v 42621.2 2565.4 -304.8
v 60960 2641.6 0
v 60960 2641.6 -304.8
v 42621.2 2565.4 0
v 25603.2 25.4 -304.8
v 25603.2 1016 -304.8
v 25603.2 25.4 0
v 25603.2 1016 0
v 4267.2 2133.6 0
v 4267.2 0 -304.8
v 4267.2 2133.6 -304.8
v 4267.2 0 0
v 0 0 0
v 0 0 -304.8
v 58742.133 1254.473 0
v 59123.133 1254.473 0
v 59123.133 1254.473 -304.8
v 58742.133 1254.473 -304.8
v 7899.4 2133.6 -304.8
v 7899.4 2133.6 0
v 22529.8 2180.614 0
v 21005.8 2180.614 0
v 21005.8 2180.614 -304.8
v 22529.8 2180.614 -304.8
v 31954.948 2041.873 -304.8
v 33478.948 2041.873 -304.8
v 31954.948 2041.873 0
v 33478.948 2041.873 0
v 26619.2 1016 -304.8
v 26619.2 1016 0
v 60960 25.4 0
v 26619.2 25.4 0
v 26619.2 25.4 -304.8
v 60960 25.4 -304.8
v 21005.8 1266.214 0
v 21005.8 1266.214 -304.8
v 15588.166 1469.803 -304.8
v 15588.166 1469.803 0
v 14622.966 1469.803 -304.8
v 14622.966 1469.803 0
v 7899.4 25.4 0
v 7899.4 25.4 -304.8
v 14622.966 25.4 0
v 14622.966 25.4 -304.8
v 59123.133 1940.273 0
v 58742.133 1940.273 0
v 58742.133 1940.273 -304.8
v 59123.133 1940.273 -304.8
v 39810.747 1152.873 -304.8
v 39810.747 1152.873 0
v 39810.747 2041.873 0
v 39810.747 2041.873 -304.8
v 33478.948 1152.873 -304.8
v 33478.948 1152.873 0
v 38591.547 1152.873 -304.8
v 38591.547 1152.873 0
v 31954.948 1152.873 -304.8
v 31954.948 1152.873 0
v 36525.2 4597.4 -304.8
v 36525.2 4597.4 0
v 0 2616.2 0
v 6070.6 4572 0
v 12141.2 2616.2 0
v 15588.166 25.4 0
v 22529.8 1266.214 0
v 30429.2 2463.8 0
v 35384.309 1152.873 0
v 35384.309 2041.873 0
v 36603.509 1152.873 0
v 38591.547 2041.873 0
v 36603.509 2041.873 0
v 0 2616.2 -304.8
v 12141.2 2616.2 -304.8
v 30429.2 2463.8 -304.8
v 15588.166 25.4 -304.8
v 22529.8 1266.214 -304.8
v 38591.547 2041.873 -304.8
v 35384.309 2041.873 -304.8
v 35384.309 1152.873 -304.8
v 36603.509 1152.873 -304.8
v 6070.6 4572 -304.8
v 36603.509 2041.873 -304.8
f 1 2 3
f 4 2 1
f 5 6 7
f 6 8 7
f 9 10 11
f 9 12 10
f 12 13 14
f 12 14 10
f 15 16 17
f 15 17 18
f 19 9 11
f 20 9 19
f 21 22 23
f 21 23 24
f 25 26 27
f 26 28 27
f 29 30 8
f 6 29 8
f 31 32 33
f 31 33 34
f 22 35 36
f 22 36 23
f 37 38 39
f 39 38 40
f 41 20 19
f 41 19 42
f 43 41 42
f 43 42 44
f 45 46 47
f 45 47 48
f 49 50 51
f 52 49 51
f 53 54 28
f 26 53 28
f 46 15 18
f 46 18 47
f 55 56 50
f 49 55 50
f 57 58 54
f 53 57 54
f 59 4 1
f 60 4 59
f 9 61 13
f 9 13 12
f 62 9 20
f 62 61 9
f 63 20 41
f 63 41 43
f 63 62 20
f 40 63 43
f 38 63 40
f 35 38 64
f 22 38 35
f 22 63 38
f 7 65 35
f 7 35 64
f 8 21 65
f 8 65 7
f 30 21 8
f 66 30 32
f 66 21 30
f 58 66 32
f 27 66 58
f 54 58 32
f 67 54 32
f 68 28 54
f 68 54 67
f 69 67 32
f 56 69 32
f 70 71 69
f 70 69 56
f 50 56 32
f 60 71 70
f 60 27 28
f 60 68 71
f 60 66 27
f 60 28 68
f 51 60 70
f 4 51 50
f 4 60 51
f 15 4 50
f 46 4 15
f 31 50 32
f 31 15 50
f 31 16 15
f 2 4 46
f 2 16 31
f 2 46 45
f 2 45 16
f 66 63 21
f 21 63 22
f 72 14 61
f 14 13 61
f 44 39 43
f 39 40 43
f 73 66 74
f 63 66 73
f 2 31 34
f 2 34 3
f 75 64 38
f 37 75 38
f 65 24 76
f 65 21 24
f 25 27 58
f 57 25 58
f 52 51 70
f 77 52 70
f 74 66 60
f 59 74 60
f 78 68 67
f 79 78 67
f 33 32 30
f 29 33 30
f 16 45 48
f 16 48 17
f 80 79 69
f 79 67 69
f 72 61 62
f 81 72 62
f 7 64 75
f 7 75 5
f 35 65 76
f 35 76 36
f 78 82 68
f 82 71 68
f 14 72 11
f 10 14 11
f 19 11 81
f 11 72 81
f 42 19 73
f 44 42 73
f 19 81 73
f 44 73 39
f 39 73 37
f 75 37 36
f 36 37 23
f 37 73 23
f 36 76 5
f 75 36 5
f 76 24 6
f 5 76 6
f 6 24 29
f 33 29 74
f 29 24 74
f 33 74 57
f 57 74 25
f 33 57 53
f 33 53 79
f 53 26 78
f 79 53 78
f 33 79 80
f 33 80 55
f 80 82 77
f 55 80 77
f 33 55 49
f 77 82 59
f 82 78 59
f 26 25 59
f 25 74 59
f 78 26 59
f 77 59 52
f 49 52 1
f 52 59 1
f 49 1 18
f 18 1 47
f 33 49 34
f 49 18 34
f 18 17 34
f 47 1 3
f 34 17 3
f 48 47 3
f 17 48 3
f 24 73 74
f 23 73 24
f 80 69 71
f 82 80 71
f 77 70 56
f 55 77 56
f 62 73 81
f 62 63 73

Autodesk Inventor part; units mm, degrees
ref_plane "YZ Plane" through (0, 0, 0) normal (1, 0, 0) x (0, 1, 0)
ref_plane "XZ Plane" through (0, 0, 0) normal (0, 1, 0) x (-1, 0, 0)
ref_plane "XY Plane" through (0, 0, 0) normal (0, 0, 1) x (1, 0, 0)
sketch "Sketch1" plane through (0, 0, 0) normal (0, 0, 1) x (1, 0, 0)
  line L0 (0, 0) -> (0, 2616.2)
  line L1 (0, 0) -> (4267.2, 0)
  line L2 (4267.2, 0) -> (4267.2, 2133.6)
  line L3 (4267.2, 2133.6) -> (7899.4, 2133.6)
  line L4 (7899.4, 2133.6) -> (7899.4, 25.4)
  line L5 (7899.4, 25.4) -> (12141.2, 25.4)
  line L6 (12141.2, 25.4) -> (12141.2, 2616.2)
  line L7 (12141.2, 2616.2) -> (0, 2616.2) construction
  line L8 (6070.6, 2616.2) -> (6070.6, 6494.6516) construction
  line L9 (0, 2616.2) -> (6070.6, 4572)
  line L10 (12141.2, 2616.2) -> (6070.6, 4572)
  line L11 (12141.2, 25.4) -> (30429.2, 25.4)
  line L12 (30429.2, 25.4) -> (30429.2, 2463.8)
  line L13 (30429.2, 2463.8) -> (12141.2, 2616.2)
  line L14 (14622.9659, 25.4) -> (15588.1659, 25.4)
  line L15 (15588.1659, 25.4) -> (15588.1659, 1469.803)
  line L16 (15588.1659, 1469.803) -> (14622.9659, 1469.803)
  line L17 (14622.9659, 1469.803) -> (14622.9659, 25.4)
  line L18 (21005.8, 2180.6143) -> (22529.8, 2180.6143)
  line L19 (22529.8, 2180.6143) -> (22529.8, 1266.2143)
  line L20 (22529.8, 1266.2143) -> (21005.8, 1266.2143)
  line L21 (21005.8, 1266.2143) -> (21005.8, 2180.6143)
  line L22 (21005.8, 2180.6143) -> (22529.8, 1266.2143) construction
  line L23 (22529.8, 2180.6143) -> (21005.8, 1266.2143) construction
  line L24 (30429.2, 25.4) -> (42621.2, 25.4)
  line L25 (42621.2, 25.4) -> (42621.2, 2565.4)
  line L26 (36525.2, 25.4) -> (36525.2, 4597.4) construction
  line L27 (30429.2, 2463.8) -> (36525.2, 4597.4)
  line L28 (42621.2, 2565.4) -> (36525.2, 4597.4)
  line L29 (31954.9483, 1152.8729) -> (33478.9483, 1152.8729)
  line L30 (33478.9483, 1152.8729) -> (33478.9483, 2041.8729)
  line L31 (33478.9483, 2041.8729) -> (31954.9483, 2041.8729)
  line L32 (31954.9483, 2041.8729) -> (31954.9483, 1152.8729)
  line L33 (31954.9483, 1152.8729) -> (33478.9483, 2041.8729) construction
  line L34 (33478.9483, 1152.8729) -> (31954.9483, 2041.8729) construction
  line L35 (35384.3088, 1152.8729) -> (36603.5088, 1152.8729)
  line L36 (36603.5088, 1152.8729) -> (36603.5088, 2041.8729)
  line L37 (36603.5088, 2041.8729) -> (35384.3088, 2041.8729)
  line L38 (35384.3088, 2041.8729) -> (35384.3088, 1152.8729)
  line L39 (35384.3088, 1152.8729) -> (36603.5088, 2041.8729) construction
  line L40 (36603.5088, 1152.8729) -> (35384.3088, 2041.8729) construction
  line L41 (38591.5468, 1152.8729) -> (39810.7468, 1152.8729)
  line L42 (39810.7468, 1152.8729) -> (39810.7468, 2041.8729)
  line L43 (39810.7468, 2041.8729) -> (38591.5468, 2041.8729)
  line L44 (38591.5468, 2041.8729) -> (38591.5468, 1152.8729)
  line L45 (38591.5468, 1152.8729) -> (39810.7468, 2041.8729) construction
  line L46 (39810.7468, 1152.8729) -> (38591.5468, 2041.8729) construction
  line L47 (42621.2, 25.4) -> (60960, 25.4)
  line L48 (60960, 25.4) -> (60960, 2641.6)
  line L49 (60960, 2641.6) -> (42621.2, 2565.4)
  line L50 (59123.1327, 1254.4729) -> (58742.1327, 1254.4729)
  line L51 (58742.1327, 1254.4729) -> (58742.1327, 1940.2729)
  line L52 (58742.1327, 1940.2729) -> (59123.1327, 1940.2729)
  line L53 (59123.1327, 1940.2729) -> (59123.1327, 1254.4729)
  line L54 (59123.1327, 1254.4729) -> (58742.1327, 1940.2729) construction
  line L55 (58742.1327, 1254.4729) -> (59123.1327, 1940.2729) construction
  line L56 (25603.2, 25.4) -> (26619.2, 25.4)
  line L57 (26619.2, 25.4) -> (26619.2, 1016)
  line L58 (26619.2, 1016) -> (25603.2, 1016)
  line L59 (25603.2, 1016) -> (25603.2, 25.4)
  point P0 (21767.8, 1723.4143)
  point P1 (32716.9483, 1597.3729)
  point P2 (35993.9088, 1597.3729)
  point P3 (39201.1468, 1597.3729)
  point P4 (58932.6327, 1597.3729)
  dimension "d0" = 2616.2
  dimension "d1" = 4267.2
  dimension "d2" = 2133.6
  dimension "d3" = 3632.2
  dimension "d4" = 4241.8
  dimension "d5" = 2590.8
  dimension "d6" = 18288
  dimension "d7" = 2438.4
  dimension "d8" = 965.2
  dimension "d9" = 914.4
  dimension "d10" = 1524
  dimension "d11" = 4572
  dimension "d12" = 12192
  dimension "d13" = 2540
  dimension "d14" = 4572
  dimension "d15" = 1524
  dimension "d16" = 889
  dimension "d17" = 1219.2
  dimension "d18" = 889
  dimension "d19" = 1219.2
  dimension "d20" = 889
  dimension "d21" = 18338.8
  dimension "d22" = 2616.2
  dimension "d23" = 381
  dimension "d24" = 685.8
  dimension "d27" = 1016
  dimension "d28" = 990.6
  dimension "d29" = 3810
  dimension "d30" = 3073.4
  dimension "d33" = 60960
  dimension "d34" = 6377.8788
  dimension "d35" = 6377.8788
  dimension "d36" = 18288
  dimension "d37" = 6458.5962
  dimension "d38" = 6425.7482
  dimension "d39" = 18338.8
extrude "Extrusion2" add sketch "Sketch1" against normal blind 304.8 contours L0 L9 L10 L6 L5 L4 L3 L2 L1 | L13 L12 L11 L57 L58 L59 L15 L16 L17 L6 | L27 L28 L25 L24 L12 | L25 L49 L48 L47
properties part number "unwrappedBarnAboveCementRocks"
